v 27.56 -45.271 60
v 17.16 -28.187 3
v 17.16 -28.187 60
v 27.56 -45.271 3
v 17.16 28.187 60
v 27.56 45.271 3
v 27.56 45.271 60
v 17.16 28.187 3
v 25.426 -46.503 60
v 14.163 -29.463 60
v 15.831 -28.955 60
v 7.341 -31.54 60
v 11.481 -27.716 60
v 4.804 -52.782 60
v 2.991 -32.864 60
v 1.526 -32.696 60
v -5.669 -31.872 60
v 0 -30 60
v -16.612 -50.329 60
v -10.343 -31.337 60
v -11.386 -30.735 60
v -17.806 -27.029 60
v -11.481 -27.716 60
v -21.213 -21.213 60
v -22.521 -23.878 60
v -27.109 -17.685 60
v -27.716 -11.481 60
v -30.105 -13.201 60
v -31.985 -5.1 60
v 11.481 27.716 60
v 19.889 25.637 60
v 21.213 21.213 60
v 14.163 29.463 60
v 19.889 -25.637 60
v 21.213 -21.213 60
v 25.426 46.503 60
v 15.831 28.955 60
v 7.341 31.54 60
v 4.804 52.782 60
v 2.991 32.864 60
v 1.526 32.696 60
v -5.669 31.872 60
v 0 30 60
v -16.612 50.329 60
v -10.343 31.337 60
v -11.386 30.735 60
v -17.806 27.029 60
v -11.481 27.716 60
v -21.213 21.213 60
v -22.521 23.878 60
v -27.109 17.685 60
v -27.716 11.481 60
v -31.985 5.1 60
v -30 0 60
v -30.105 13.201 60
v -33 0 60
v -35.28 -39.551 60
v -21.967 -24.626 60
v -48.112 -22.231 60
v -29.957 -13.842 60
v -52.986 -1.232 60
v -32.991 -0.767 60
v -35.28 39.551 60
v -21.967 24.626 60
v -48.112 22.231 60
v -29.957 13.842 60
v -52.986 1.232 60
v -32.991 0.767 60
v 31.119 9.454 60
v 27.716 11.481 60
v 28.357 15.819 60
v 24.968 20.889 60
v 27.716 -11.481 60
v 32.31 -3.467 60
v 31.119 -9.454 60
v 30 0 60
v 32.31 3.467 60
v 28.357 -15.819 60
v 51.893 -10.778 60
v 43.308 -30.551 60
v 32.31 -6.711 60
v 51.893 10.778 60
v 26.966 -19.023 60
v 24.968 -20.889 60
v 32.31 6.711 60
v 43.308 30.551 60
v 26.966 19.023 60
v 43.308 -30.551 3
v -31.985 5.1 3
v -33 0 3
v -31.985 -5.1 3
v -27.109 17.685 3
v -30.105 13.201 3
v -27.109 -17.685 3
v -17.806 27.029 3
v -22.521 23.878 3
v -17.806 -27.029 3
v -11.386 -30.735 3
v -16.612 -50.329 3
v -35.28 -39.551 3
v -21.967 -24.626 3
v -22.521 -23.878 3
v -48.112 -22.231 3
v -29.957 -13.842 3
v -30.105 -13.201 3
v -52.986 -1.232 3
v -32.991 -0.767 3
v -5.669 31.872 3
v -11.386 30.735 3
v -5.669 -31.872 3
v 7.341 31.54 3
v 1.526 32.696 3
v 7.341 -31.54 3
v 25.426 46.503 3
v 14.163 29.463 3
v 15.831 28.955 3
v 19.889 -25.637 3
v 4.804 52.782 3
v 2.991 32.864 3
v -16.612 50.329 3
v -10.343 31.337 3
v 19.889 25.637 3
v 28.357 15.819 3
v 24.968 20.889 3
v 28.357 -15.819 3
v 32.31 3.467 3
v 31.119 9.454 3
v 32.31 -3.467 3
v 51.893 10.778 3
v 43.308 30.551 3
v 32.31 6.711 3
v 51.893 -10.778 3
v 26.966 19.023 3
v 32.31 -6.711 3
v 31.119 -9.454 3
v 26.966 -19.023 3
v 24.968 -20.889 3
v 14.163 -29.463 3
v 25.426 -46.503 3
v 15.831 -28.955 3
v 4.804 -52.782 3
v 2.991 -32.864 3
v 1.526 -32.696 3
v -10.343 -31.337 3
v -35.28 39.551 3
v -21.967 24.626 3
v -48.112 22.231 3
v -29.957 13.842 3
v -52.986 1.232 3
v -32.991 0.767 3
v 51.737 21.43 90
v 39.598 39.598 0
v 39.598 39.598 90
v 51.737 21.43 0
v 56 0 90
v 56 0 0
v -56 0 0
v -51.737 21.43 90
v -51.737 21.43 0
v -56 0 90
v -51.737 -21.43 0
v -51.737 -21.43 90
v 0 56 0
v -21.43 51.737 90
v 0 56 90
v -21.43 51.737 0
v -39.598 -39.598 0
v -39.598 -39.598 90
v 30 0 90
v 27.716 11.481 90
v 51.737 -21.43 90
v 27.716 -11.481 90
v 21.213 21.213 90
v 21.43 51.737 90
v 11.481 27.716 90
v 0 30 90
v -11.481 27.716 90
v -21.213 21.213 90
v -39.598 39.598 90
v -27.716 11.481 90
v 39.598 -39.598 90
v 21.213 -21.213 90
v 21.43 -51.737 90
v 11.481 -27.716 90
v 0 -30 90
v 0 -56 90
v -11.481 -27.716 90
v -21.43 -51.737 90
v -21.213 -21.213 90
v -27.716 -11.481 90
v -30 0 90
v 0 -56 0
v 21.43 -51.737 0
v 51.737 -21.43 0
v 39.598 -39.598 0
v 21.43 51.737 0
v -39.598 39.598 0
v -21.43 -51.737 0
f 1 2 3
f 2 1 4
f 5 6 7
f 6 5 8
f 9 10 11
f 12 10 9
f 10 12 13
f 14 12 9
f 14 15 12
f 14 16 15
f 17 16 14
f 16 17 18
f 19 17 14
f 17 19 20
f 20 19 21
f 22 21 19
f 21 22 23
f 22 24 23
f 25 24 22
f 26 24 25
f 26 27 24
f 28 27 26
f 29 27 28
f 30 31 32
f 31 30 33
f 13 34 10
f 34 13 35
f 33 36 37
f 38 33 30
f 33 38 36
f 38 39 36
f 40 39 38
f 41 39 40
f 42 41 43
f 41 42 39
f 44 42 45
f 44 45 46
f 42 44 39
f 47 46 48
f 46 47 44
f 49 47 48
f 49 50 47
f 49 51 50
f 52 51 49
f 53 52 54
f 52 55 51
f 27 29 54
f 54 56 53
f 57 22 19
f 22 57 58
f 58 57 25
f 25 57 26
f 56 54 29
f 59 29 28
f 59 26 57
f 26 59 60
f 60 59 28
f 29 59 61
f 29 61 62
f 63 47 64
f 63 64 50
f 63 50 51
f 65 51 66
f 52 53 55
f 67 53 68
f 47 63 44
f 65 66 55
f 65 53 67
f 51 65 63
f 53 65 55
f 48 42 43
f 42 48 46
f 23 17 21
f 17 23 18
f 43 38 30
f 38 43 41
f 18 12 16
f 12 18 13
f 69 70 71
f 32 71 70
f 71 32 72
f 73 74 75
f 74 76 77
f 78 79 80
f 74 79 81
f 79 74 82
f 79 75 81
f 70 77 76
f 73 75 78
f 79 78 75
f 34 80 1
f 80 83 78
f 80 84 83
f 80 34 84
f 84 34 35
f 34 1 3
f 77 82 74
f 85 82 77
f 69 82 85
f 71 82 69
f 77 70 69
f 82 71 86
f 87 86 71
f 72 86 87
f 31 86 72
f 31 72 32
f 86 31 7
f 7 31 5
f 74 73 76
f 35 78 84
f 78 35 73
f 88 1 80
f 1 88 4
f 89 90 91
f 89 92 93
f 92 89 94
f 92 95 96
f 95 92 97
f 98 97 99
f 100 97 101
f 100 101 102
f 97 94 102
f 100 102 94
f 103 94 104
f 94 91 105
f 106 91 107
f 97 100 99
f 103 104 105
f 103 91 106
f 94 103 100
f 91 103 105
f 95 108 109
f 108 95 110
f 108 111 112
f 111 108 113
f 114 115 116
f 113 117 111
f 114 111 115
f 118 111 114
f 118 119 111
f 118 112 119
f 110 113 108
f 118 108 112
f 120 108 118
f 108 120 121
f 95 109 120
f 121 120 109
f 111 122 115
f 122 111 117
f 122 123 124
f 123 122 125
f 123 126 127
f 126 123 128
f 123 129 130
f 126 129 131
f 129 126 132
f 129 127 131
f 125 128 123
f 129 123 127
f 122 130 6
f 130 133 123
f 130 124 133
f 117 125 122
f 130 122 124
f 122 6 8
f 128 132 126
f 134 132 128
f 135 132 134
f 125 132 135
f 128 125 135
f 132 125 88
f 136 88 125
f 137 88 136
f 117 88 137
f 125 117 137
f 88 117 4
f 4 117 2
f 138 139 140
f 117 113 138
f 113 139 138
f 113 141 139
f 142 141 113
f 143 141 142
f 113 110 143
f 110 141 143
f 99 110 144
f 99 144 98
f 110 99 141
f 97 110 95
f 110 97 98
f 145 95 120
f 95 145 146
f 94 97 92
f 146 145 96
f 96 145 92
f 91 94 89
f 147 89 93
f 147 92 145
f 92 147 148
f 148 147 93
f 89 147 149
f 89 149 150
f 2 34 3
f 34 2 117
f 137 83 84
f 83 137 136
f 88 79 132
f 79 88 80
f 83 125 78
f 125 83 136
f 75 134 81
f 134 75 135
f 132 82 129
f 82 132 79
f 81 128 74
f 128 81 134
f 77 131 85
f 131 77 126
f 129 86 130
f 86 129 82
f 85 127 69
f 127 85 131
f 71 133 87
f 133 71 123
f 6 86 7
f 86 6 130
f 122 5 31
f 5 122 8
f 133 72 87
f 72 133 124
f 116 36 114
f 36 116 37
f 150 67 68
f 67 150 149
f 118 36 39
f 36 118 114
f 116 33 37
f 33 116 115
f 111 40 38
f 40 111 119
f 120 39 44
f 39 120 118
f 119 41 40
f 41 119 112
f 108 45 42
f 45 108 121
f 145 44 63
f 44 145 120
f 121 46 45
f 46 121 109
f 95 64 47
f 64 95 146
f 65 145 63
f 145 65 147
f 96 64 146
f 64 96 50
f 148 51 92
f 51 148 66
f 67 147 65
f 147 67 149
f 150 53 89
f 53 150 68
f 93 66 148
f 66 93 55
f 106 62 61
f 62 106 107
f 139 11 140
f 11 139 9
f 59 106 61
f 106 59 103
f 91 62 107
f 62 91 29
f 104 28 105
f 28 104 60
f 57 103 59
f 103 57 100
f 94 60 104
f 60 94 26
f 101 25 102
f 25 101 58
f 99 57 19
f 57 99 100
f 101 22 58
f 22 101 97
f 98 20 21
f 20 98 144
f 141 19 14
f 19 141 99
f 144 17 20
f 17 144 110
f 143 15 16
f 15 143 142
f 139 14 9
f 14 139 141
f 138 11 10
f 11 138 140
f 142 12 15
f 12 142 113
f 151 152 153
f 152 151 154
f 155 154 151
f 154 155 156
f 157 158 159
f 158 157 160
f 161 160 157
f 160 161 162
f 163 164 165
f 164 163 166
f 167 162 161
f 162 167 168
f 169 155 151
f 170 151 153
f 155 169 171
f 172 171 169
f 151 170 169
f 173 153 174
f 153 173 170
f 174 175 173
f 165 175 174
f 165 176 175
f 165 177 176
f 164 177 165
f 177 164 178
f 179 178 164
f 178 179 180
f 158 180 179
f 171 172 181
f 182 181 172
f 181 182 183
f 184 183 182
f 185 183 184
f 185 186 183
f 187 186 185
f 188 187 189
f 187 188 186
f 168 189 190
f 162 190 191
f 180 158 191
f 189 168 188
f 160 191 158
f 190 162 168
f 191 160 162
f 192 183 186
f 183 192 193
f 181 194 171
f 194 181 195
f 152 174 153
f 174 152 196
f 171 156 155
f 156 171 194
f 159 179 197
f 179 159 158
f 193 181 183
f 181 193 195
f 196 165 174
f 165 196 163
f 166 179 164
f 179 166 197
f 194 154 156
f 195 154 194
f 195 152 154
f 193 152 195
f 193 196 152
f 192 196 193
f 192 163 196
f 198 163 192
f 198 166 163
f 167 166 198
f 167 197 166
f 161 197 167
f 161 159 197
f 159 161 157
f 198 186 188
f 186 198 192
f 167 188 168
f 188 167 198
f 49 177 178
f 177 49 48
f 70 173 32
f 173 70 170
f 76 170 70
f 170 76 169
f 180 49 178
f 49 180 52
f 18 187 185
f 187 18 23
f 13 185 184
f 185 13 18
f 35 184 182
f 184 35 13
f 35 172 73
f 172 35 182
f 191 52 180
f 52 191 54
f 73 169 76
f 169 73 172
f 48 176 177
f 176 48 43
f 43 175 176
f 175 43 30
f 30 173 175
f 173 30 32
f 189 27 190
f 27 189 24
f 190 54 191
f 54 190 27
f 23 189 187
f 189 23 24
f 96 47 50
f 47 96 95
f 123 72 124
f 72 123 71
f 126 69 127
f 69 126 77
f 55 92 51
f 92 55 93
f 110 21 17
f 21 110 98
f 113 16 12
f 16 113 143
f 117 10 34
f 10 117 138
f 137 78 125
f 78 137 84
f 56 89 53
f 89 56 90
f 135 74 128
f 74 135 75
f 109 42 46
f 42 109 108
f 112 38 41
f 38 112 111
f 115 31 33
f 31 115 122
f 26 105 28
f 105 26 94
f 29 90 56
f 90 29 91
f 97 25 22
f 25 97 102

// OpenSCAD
// Stiftköcher mit innerem Kern + schmalem Außenring (mit echten Fächern)
// Version 2.1

// --- Parameter ---
inner_diameter      = 60;   // Durchmesser des inneren Hauptfachs (mm)
inner_height        = 90;   // Höhe des inneren Fachs (mm)

outer_ring_width    = 20;   // Breite des äußeren Ringes (mm)
outer_height        = 60;   // Höhe des äußeren Ringes (mm)

wall_thickness      = 3;    // Außenwandstärke (mm)
bottom_thickness    = 3;    // Bodenstärke (mm)

outer_compartments  = 3;   // Anzahl der schmalen Außenfächer
outer_wall_thickness= 2;    // Dicke der Zwischenwände (mm) — wird in Winkel umgerechnet

$fn = 16; // Glätte für Rundungen

// --- Hilfsfunktion: Grad/Rad ---
function rad2deg(a) = a * 180 / PI;

// --- Modul: Ringschneide-Sektor (für Hohlräume der Außenfächer) ---
module ring_sector(r_in, r_out, angle_deg, h) {
    // Rechteck: (radiale Dicke x Höhe) wird um Z rotiert -> Torus-Segment
    rotate([0,0,-angle_deg/2])  // Zentriere den Sektor um 0°
    rotate_extrude(angle = angle_deg, convexity = 10)
        translate([r_in, 0, 0])
            square([r_out - r_in, h], center = false);
}

// --- Hauptmodul ---
module pen_holder() {
    inner_r = inner_diameter/2;
    outer_shell_r = inner_r + wall_thickness + outer_ring_width + wall_thickness;

    // 1) Außenkörper (Mantel + Boden)
    difference() {
        // Vollkörper außen
        union() {
            cylinder(h = max(inner_height, outer_height), r = outer_shell_r);
            // Optional: leichte Fase oben
            // translate([0,0,max(inner_height,outer_height)-1])
            //     cylinder(h=1, r1=outer_shell_r, r2=outer_shell_r-1);
        }

        // Innenaushöhlung: großes Innenfach
        translate([0,0,bottom_thickness])
            cylinder(h = inner_height - bottom_thickness, r = inner_r);

        // Außenring freistellen (zwischen innerer Wand und äußeren Wand)
        translate([0,0,bottom_thickness])
            cylinder(h = outer_height - bottom_thickness, r = inner_r + wall_thickness);

        // 2) Fächer im Außenring als ausgesparte Sektoren
        // Winkelberechnung: Wanddicke in Winkel am mittleren Ringradius
        ring_r_in   = inner_r + wall_thickness;
        ring_r_out  = ring_r_in + outer_ring_width;
        ring_mid_r  = (ring_r_in + ring_r_out) / 2;

        wall_angle_deg = rad2deg(outer_wall_thickness / ring_mid_r); // Bogen -> Winkel
        base_angle_deg = 360 / outer_compartments;
        slot_angle_deg = max(1, base_angle_deg - wall_angle_deg);     // Öffnungswinkel pro Fach

        // Aussparungen für alle Außenfächer
        for (i = [0:outer_compartments-1]) {
            angle_center = i * base_angle_deg;
            // Sektor anheben, damit Boden stehen bleibt
            translate([0,0,bottom_thickness])
                rotate([0,0,angle_center])
                    ring_sector(ring_r_in, ring_r_out, slot_angle_deg, outer_height - bottom_thickness);
        }
    }
}

// --- Aufruf ---
pen_holder();
